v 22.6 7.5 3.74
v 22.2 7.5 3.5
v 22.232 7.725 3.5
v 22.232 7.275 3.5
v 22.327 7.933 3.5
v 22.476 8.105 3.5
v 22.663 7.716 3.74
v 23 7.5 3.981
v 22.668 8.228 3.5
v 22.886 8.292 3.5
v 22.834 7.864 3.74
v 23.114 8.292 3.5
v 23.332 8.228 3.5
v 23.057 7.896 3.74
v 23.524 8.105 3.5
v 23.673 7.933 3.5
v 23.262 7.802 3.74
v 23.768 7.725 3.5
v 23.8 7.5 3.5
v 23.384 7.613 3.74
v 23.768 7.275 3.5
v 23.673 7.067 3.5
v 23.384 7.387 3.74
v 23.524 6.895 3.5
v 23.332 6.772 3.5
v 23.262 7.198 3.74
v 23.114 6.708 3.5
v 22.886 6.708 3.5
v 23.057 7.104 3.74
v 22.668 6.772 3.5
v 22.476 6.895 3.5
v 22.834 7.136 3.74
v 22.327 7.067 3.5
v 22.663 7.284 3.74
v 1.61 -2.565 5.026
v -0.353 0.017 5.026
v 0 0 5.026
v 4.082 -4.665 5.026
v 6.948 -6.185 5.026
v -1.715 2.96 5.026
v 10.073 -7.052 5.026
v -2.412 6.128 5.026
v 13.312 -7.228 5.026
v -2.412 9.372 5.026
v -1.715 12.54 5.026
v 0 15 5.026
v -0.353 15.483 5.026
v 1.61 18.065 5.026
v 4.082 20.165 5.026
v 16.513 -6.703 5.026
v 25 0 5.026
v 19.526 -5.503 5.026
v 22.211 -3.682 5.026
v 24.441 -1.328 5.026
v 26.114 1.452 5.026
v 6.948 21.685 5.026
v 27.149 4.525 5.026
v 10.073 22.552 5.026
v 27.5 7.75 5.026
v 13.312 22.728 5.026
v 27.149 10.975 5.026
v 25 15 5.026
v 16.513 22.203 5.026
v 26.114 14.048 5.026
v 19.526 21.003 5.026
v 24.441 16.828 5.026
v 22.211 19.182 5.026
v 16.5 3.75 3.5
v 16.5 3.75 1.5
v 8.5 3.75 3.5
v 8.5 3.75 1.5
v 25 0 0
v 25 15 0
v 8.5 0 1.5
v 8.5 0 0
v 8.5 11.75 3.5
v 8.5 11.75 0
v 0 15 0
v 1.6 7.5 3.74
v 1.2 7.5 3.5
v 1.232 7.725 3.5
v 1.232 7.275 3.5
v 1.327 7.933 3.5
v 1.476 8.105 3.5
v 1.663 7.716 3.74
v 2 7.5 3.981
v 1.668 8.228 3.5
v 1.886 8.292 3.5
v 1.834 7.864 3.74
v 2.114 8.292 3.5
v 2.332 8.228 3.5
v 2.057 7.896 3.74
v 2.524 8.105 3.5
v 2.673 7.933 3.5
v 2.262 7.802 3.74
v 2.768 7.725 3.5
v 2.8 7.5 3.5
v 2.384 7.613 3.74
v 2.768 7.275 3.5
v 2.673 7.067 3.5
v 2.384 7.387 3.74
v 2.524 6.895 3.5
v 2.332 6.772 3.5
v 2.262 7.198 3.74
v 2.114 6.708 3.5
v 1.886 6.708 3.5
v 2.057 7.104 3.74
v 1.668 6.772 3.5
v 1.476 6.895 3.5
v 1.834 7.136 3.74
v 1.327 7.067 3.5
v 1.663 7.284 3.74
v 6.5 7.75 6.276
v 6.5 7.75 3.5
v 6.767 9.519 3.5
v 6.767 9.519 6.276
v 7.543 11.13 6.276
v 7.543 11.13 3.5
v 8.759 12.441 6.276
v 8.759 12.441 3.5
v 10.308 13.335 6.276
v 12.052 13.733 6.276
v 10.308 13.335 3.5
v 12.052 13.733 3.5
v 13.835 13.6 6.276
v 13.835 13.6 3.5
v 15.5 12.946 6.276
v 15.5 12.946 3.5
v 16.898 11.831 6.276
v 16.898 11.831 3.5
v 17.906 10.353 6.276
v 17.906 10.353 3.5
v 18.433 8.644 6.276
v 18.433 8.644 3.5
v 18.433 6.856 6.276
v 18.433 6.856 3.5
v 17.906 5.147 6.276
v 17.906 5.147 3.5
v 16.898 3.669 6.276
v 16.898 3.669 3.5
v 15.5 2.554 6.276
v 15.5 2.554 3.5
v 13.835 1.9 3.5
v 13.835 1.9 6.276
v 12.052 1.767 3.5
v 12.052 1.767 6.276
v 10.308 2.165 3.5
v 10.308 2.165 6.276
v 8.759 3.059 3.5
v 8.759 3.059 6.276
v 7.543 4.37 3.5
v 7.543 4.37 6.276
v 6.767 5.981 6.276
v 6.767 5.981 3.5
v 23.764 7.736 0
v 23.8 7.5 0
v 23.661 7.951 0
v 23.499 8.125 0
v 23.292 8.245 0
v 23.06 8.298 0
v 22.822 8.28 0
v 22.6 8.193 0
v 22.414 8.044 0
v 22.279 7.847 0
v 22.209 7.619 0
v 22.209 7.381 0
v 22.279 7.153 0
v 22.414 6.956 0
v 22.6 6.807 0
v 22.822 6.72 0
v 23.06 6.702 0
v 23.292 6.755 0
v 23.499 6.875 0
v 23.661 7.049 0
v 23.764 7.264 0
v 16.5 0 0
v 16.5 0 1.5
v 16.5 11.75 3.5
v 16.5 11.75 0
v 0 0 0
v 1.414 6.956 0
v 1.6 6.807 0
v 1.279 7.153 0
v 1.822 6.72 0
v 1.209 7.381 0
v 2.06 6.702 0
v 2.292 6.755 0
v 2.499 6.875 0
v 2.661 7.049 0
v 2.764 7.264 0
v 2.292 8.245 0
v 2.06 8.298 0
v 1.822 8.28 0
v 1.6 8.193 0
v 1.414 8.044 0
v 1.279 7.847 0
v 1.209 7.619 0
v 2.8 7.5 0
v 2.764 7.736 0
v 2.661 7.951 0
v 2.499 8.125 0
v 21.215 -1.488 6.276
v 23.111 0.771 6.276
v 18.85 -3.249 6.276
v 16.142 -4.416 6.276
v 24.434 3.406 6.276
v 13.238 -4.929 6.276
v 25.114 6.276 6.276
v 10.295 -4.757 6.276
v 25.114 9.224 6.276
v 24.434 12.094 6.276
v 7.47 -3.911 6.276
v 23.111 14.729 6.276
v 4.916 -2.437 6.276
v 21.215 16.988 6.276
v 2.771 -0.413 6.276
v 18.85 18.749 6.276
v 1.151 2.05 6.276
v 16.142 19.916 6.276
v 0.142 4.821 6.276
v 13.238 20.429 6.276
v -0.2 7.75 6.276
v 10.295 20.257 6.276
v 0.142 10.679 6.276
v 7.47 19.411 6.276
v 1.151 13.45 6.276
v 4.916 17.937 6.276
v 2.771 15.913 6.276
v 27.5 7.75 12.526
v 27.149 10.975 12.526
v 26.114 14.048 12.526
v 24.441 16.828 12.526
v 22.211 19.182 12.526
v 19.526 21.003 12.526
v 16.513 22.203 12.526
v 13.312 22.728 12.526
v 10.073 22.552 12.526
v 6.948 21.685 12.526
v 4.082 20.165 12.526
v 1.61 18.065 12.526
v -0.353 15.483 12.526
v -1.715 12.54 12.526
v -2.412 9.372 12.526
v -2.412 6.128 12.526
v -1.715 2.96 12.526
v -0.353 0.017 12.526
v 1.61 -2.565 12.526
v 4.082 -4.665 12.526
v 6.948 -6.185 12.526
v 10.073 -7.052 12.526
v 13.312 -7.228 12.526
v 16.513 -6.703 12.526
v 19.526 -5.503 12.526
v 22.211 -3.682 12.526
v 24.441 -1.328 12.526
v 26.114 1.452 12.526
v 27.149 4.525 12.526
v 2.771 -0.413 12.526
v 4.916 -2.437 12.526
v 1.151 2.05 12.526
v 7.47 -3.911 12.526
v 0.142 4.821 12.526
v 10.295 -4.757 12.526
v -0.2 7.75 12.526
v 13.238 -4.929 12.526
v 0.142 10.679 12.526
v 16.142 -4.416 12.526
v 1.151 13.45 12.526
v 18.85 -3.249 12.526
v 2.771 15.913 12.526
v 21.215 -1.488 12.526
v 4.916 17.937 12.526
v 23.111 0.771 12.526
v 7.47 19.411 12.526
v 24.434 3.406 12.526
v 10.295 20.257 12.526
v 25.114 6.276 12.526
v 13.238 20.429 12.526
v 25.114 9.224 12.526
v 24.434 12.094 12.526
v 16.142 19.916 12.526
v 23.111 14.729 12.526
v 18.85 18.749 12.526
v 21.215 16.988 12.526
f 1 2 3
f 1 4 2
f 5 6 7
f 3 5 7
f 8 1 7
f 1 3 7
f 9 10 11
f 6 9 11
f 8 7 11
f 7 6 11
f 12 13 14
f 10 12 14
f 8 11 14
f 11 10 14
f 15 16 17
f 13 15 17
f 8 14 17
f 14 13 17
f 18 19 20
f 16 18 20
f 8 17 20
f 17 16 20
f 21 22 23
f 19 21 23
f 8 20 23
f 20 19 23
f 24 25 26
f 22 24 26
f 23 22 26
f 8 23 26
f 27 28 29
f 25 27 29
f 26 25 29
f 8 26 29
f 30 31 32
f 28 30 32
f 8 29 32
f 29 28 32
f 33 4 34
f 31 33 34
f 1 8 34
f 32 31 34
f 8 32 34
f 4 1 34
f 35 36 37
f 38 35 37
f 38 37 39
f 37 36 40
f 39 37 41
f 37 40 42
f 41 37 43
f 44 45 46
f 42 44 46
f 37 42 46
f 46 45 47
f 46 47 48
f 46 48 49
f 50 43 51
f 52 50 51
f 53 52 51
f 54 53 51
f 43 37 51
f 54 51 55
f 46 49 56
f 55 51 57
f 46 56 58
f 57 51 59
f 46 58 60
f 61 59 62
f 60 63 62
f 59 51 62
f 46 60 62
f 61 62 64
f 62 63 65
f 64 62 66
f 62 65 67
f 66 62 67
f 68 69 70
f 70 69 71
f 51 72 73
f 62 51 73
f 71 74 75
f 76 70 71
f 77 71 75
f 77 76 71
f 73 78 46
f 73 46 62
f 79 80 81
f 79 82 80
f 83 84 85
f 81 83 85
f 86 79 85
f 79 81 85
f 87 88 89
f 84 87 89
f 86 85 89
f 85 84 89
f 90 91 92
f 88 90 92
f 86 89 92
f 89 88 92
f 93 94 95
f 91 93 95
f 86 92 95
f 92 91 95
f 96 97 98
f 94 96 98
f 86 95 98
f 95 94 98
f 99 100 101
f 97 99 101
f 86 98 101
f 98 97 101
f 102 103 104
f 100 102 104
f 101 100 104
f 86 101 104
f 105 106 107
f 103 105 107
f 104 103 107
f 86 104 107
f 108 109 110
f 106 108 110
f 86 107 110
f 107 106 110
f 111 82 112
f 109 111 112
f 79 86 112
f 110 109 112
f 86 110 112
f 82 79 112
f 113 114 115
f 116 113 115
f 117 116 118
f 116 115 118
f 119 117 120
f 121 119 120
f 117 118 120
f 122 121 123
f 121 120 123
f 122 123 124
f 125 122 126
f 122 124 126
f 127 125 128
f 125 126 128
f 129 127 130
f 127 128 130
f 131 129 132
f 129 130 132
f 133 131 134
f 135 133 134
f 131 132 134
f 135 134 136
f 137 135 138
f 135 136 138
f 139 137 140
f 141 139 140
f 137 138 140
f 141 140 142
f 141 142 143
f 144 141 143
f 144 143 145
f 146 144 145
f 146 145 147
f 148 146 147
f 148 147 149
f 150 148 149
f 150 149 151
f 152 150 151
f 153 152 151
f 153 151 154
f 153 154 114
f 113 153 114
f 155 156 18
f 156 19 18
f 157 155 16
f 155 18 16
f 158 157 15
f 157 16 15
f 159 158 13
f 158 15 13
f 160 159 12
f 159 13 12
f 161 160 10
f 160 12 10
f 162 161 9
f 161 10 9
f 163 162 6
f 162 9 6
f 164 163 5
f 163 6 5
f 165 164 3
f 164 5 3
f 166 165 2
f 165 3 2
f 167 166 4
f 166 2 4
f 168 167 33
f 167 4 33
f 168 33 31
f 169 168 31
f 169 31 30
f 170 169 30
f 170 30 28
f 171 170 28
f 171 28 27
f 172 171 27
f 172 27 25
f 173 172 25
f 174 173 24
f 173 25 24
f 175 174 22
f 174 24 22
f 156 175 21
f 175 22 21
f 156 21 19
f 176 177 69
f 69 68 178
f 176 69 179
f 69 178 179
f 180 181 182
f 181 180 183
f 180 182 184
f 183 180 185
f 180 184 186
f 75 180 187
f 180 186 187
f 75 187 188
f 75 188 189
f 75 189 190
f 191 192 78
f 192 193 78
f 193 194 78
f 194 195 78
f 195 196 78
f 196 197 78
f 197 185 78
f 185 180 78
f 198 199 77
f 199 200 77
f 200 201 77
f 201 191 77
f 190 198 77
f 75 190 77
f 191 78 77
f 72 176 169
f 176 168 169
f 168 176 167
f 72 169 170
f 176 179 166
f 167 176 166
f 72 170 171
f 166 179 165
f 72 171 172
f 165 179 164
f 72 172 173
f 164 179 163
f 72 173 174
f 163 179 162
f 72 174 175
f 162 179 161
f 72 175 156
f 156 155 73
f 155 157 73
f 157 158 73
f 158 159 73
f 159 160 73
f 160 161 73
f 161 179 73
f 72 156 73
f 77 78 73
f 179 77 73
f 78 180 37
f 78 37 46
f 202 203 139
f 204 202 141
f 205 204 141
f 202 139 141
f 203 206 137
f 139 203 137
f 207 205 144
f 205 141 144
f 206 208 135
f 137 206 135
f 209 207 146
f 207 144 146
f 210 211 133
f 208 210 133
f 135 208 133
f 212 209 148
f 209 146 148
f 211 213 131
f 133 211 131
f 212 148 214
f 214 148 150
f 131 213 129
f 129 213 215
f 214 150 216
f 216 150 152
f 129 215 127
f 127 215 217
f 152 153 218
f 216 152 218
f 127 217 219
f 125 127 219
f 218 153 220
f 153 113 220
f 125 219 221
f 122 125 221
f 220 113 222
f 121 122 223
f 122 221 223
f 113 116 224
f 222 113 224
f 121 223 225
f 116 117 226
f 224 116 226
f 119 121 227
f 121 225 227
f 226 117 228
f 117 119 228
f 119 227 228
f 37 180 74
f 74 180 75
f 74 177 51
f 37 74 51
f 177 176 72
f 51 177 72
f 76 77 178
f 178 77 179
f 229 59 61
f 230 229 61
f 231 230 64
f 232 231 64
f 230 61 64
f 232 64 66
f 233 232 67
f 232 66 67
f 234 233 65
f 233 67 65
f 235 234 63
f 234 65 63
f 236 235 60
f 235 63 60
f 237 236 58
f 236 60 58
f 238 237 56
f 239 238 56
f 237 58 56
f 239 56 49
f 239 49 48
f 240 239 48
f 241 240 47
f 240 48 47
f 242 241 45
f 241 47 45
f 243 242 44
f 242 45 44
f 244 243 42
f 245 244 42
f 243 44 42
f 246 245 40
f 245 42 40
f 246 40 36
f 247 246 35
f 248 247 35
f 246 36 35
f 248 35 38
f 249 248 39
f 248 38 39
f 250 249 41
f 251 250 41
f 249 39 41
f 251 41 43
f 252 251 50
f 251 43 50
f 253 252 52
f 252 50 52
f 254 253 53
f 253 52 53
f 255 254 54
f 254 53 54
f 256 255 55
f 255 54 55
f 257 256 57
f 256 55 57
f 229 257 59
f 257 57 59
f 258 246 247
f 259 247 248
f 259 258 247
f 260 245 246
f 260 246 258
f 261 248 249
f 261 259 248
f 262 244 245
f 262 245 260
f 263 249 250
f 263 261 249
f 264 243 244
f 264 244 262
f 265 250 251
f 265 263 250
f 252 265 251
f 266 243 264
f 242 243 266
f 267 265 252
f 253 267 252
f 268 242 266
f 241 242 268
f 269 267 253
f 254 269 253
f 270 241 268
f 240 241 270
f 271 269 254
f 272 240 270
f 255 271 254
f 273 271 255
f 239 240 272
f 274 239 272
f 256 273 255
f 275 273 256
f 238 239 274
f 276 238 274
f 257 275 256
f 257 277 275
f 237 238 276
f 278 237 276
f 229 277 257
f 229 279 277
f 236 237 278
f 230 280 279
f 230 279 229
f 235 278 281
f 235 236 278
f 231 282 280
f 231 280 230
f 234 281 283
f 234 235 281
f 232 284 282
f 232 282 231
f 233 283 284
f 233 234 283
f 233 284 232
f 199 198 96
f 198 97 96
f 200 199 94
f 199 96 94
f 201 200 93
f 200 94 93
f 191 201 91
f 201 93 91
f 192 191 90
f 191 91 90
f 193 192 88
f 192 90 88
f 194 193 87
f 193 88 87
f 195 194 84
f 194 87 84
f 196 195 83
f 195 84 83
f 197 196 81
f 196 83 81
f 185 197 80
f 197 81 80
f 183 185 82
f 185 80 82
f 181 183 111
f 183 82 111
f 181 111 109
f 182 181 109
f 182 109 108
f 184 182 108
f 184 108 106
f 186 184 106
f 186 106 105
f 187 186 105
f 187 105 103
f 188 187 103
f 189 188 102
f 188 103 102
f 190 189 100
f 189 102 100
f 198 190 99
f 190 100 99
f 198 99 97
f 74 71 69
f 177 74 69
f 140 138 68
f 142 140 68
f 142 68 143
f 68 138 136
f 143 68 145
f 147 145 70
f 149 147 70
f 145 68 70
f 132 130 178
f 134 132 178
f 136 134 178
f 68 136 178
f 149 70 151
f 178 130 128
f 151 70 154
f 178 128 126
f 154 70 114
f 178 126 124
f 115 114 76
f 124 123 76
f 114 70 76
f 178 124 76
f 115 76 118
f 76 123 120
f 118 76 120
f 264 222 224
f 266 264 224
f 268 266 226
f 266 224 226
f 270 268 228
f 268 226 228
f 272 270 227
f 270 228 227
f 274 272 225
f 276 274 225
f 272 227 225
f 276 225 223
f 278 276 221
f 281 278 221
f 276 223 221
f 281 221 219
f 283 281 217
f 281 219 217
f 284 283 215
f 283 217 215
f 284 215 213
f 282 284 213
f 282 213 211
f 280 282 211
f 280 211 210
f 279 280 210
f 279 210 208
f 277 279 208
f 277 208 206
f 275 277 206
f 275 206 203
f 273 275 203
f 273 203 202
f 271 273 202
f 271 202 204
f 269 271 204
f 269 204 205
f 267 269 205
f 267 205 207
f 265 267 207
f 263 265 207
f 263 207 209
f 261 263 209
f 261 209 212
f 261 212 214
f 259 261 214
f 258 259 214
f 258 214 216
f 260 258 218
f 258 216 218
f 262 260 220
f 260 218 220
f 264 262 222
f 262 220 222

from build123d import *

# Parameters (mm, degrees)
SKETCH1_W                     = 25
SKETCH1_H                     = 15
BOSS_EXTRUDE1_DEPTH           = 5.026
M2_TAPPED_HOLE1_D             = 1.6
M2_TAPPED_HOLE1_DEPTH         = 3.5
M2_TAPPED_HOLE1_TIP           = 0.480688495
SKETCH5_R                     = 15
BOSS_EXTRUDE2_DEPTH           = 7.5
SKETCH6_R                     = 12.25
CUT_EXTRUDE1_DEPTH            = 5.25
F_1_1_8_12_TAPPED_HOLE2_D     = 25.4
F_1_1_8_12_TAPPED_HOLE2_DEPTH = 6.25
CUT_EXTRUDE2_DEPTH            = 3.5
SKETCH14_W                    = 8
SKETCH14_H                    = 1.5
CUT_EXTRUDE3_DEPTH            = 13.5
SKETCH15_R                    = 6
CUT_EXTRUDE4_DEPTH            = 13.5


with BuildPart() as part:
    # Sketch1 → Boss-Extrude1 (new body)
    with BuildSketch(Plane.XY):
        with Locations((12.5, 7.5)):
            Rectangle(SKETCH1_W, SKETCH1_H)
    extrude(amount=BOSS_EXTRUDE1_DEPTH)

    # M2 Tapped Hole1
    with Locations(Plane(origin=(0, 0, 0), x_dir=(-1, 0, 0), z_dir=(0, 0, -1))):
        with Locations((-23, 7.5), (-2, 7.5)):
            Hole(M2_TAPPED_HOLE1_D / 2, depth=M2_TAPPED_HOLE1_DEPTH)
            with Locations((0, 0, -(M2_TAPPED_HOLE1_DEPTH + M2_TAPPED_HOLE1_TIP / 2))):  # 118° drill point
                Cone(0, M2_TAPPED_HOLE1_D / 2, M2_TAPPED_HOLE1_TIP, mode=Mode.SUBTRACT)

    # Sketch5 → Boss-Extrude2 (add)
    with BuildSketch(Plane.XY.offset(5.026)):
        with Locations((12.5, 7.75)):
            Circle(SKETCH5_R)
    extrude(amount=BOSS_EXTRUDE2_DEPTH)

    # Sketch6 → Cut-Extrude1 (cut)
    with BuildSketch(Plane.XY.offset(12.526)):
        with Locations((12.5, 7.75)):
            Circle(SKETCH6_R)
    extrude(amount=-CUT_EXTRUDE1_DEPTH, mode=Mode.SUBTRACT)

    # 1-1/8-12 Tapped Hole2
    with Locations(Plane.XY.offset(12.526)):
        with Locations((12.5, 7.75)):
            Hole(F_1_1_8_12_TAPPED_HOLE2_D / 2, depth=F_1_1_8_12_TAPPED_HOLE2_DEPTH)

    # Sketch13 → Cut-Extrude2 (cut)
    with BuildSketch(Plane(origin=(0, 0, 0), x_dir=(-1, 0, 0), z_dir=(0, 0, -1))):
        Polygon((-12.5, 3.75), (-12.5, 7.5), (-12.5, 7.75), (-12.5, 11.75), (-16.5, 11.75), (-16.5, 3.75), align=None)
        Polygon((-12.5, 7.75), (-12.5, 7.5), (-12.5, 3.75), (-8.5, 3.75), (-8.5, 11.75), (-12.5, 11.75), align=None)
    extrude(amount=-CUT_EXTRUDE2_DEPTH, mode=Mode.SUBTRACT)

    # Sketch14 → Cut-Extrude3 (cut)
    with BuildSketch(Plane(origin=(0, 3.75, 0), x_dir=(1, 0, 0), z_dir=(0, 1, 0))):
        with Locations((12.5, -0.75)):
            Rectangle(SKETCH14_W, SKETCH14_H)
    extrude(amount=-CUT_EXTRUDE3_DEPTH, mode=Mode.SUBTRACT)

    # Sketch15 → Cut-Extrude4 (cut)
    with BuildSketch(Plane(origin=(0, 0, 3.5), x_dir=(-1, 0, 0), z_dir=(0, 0, -1))):
        with Locations((-12.5, 7.75)):
            Circle(SKETCH15_R)
    extrude(amount=-CUT_EXTRUDE4_DEPTH, mode=Mode.SUBTRACT)


solid = part.part
